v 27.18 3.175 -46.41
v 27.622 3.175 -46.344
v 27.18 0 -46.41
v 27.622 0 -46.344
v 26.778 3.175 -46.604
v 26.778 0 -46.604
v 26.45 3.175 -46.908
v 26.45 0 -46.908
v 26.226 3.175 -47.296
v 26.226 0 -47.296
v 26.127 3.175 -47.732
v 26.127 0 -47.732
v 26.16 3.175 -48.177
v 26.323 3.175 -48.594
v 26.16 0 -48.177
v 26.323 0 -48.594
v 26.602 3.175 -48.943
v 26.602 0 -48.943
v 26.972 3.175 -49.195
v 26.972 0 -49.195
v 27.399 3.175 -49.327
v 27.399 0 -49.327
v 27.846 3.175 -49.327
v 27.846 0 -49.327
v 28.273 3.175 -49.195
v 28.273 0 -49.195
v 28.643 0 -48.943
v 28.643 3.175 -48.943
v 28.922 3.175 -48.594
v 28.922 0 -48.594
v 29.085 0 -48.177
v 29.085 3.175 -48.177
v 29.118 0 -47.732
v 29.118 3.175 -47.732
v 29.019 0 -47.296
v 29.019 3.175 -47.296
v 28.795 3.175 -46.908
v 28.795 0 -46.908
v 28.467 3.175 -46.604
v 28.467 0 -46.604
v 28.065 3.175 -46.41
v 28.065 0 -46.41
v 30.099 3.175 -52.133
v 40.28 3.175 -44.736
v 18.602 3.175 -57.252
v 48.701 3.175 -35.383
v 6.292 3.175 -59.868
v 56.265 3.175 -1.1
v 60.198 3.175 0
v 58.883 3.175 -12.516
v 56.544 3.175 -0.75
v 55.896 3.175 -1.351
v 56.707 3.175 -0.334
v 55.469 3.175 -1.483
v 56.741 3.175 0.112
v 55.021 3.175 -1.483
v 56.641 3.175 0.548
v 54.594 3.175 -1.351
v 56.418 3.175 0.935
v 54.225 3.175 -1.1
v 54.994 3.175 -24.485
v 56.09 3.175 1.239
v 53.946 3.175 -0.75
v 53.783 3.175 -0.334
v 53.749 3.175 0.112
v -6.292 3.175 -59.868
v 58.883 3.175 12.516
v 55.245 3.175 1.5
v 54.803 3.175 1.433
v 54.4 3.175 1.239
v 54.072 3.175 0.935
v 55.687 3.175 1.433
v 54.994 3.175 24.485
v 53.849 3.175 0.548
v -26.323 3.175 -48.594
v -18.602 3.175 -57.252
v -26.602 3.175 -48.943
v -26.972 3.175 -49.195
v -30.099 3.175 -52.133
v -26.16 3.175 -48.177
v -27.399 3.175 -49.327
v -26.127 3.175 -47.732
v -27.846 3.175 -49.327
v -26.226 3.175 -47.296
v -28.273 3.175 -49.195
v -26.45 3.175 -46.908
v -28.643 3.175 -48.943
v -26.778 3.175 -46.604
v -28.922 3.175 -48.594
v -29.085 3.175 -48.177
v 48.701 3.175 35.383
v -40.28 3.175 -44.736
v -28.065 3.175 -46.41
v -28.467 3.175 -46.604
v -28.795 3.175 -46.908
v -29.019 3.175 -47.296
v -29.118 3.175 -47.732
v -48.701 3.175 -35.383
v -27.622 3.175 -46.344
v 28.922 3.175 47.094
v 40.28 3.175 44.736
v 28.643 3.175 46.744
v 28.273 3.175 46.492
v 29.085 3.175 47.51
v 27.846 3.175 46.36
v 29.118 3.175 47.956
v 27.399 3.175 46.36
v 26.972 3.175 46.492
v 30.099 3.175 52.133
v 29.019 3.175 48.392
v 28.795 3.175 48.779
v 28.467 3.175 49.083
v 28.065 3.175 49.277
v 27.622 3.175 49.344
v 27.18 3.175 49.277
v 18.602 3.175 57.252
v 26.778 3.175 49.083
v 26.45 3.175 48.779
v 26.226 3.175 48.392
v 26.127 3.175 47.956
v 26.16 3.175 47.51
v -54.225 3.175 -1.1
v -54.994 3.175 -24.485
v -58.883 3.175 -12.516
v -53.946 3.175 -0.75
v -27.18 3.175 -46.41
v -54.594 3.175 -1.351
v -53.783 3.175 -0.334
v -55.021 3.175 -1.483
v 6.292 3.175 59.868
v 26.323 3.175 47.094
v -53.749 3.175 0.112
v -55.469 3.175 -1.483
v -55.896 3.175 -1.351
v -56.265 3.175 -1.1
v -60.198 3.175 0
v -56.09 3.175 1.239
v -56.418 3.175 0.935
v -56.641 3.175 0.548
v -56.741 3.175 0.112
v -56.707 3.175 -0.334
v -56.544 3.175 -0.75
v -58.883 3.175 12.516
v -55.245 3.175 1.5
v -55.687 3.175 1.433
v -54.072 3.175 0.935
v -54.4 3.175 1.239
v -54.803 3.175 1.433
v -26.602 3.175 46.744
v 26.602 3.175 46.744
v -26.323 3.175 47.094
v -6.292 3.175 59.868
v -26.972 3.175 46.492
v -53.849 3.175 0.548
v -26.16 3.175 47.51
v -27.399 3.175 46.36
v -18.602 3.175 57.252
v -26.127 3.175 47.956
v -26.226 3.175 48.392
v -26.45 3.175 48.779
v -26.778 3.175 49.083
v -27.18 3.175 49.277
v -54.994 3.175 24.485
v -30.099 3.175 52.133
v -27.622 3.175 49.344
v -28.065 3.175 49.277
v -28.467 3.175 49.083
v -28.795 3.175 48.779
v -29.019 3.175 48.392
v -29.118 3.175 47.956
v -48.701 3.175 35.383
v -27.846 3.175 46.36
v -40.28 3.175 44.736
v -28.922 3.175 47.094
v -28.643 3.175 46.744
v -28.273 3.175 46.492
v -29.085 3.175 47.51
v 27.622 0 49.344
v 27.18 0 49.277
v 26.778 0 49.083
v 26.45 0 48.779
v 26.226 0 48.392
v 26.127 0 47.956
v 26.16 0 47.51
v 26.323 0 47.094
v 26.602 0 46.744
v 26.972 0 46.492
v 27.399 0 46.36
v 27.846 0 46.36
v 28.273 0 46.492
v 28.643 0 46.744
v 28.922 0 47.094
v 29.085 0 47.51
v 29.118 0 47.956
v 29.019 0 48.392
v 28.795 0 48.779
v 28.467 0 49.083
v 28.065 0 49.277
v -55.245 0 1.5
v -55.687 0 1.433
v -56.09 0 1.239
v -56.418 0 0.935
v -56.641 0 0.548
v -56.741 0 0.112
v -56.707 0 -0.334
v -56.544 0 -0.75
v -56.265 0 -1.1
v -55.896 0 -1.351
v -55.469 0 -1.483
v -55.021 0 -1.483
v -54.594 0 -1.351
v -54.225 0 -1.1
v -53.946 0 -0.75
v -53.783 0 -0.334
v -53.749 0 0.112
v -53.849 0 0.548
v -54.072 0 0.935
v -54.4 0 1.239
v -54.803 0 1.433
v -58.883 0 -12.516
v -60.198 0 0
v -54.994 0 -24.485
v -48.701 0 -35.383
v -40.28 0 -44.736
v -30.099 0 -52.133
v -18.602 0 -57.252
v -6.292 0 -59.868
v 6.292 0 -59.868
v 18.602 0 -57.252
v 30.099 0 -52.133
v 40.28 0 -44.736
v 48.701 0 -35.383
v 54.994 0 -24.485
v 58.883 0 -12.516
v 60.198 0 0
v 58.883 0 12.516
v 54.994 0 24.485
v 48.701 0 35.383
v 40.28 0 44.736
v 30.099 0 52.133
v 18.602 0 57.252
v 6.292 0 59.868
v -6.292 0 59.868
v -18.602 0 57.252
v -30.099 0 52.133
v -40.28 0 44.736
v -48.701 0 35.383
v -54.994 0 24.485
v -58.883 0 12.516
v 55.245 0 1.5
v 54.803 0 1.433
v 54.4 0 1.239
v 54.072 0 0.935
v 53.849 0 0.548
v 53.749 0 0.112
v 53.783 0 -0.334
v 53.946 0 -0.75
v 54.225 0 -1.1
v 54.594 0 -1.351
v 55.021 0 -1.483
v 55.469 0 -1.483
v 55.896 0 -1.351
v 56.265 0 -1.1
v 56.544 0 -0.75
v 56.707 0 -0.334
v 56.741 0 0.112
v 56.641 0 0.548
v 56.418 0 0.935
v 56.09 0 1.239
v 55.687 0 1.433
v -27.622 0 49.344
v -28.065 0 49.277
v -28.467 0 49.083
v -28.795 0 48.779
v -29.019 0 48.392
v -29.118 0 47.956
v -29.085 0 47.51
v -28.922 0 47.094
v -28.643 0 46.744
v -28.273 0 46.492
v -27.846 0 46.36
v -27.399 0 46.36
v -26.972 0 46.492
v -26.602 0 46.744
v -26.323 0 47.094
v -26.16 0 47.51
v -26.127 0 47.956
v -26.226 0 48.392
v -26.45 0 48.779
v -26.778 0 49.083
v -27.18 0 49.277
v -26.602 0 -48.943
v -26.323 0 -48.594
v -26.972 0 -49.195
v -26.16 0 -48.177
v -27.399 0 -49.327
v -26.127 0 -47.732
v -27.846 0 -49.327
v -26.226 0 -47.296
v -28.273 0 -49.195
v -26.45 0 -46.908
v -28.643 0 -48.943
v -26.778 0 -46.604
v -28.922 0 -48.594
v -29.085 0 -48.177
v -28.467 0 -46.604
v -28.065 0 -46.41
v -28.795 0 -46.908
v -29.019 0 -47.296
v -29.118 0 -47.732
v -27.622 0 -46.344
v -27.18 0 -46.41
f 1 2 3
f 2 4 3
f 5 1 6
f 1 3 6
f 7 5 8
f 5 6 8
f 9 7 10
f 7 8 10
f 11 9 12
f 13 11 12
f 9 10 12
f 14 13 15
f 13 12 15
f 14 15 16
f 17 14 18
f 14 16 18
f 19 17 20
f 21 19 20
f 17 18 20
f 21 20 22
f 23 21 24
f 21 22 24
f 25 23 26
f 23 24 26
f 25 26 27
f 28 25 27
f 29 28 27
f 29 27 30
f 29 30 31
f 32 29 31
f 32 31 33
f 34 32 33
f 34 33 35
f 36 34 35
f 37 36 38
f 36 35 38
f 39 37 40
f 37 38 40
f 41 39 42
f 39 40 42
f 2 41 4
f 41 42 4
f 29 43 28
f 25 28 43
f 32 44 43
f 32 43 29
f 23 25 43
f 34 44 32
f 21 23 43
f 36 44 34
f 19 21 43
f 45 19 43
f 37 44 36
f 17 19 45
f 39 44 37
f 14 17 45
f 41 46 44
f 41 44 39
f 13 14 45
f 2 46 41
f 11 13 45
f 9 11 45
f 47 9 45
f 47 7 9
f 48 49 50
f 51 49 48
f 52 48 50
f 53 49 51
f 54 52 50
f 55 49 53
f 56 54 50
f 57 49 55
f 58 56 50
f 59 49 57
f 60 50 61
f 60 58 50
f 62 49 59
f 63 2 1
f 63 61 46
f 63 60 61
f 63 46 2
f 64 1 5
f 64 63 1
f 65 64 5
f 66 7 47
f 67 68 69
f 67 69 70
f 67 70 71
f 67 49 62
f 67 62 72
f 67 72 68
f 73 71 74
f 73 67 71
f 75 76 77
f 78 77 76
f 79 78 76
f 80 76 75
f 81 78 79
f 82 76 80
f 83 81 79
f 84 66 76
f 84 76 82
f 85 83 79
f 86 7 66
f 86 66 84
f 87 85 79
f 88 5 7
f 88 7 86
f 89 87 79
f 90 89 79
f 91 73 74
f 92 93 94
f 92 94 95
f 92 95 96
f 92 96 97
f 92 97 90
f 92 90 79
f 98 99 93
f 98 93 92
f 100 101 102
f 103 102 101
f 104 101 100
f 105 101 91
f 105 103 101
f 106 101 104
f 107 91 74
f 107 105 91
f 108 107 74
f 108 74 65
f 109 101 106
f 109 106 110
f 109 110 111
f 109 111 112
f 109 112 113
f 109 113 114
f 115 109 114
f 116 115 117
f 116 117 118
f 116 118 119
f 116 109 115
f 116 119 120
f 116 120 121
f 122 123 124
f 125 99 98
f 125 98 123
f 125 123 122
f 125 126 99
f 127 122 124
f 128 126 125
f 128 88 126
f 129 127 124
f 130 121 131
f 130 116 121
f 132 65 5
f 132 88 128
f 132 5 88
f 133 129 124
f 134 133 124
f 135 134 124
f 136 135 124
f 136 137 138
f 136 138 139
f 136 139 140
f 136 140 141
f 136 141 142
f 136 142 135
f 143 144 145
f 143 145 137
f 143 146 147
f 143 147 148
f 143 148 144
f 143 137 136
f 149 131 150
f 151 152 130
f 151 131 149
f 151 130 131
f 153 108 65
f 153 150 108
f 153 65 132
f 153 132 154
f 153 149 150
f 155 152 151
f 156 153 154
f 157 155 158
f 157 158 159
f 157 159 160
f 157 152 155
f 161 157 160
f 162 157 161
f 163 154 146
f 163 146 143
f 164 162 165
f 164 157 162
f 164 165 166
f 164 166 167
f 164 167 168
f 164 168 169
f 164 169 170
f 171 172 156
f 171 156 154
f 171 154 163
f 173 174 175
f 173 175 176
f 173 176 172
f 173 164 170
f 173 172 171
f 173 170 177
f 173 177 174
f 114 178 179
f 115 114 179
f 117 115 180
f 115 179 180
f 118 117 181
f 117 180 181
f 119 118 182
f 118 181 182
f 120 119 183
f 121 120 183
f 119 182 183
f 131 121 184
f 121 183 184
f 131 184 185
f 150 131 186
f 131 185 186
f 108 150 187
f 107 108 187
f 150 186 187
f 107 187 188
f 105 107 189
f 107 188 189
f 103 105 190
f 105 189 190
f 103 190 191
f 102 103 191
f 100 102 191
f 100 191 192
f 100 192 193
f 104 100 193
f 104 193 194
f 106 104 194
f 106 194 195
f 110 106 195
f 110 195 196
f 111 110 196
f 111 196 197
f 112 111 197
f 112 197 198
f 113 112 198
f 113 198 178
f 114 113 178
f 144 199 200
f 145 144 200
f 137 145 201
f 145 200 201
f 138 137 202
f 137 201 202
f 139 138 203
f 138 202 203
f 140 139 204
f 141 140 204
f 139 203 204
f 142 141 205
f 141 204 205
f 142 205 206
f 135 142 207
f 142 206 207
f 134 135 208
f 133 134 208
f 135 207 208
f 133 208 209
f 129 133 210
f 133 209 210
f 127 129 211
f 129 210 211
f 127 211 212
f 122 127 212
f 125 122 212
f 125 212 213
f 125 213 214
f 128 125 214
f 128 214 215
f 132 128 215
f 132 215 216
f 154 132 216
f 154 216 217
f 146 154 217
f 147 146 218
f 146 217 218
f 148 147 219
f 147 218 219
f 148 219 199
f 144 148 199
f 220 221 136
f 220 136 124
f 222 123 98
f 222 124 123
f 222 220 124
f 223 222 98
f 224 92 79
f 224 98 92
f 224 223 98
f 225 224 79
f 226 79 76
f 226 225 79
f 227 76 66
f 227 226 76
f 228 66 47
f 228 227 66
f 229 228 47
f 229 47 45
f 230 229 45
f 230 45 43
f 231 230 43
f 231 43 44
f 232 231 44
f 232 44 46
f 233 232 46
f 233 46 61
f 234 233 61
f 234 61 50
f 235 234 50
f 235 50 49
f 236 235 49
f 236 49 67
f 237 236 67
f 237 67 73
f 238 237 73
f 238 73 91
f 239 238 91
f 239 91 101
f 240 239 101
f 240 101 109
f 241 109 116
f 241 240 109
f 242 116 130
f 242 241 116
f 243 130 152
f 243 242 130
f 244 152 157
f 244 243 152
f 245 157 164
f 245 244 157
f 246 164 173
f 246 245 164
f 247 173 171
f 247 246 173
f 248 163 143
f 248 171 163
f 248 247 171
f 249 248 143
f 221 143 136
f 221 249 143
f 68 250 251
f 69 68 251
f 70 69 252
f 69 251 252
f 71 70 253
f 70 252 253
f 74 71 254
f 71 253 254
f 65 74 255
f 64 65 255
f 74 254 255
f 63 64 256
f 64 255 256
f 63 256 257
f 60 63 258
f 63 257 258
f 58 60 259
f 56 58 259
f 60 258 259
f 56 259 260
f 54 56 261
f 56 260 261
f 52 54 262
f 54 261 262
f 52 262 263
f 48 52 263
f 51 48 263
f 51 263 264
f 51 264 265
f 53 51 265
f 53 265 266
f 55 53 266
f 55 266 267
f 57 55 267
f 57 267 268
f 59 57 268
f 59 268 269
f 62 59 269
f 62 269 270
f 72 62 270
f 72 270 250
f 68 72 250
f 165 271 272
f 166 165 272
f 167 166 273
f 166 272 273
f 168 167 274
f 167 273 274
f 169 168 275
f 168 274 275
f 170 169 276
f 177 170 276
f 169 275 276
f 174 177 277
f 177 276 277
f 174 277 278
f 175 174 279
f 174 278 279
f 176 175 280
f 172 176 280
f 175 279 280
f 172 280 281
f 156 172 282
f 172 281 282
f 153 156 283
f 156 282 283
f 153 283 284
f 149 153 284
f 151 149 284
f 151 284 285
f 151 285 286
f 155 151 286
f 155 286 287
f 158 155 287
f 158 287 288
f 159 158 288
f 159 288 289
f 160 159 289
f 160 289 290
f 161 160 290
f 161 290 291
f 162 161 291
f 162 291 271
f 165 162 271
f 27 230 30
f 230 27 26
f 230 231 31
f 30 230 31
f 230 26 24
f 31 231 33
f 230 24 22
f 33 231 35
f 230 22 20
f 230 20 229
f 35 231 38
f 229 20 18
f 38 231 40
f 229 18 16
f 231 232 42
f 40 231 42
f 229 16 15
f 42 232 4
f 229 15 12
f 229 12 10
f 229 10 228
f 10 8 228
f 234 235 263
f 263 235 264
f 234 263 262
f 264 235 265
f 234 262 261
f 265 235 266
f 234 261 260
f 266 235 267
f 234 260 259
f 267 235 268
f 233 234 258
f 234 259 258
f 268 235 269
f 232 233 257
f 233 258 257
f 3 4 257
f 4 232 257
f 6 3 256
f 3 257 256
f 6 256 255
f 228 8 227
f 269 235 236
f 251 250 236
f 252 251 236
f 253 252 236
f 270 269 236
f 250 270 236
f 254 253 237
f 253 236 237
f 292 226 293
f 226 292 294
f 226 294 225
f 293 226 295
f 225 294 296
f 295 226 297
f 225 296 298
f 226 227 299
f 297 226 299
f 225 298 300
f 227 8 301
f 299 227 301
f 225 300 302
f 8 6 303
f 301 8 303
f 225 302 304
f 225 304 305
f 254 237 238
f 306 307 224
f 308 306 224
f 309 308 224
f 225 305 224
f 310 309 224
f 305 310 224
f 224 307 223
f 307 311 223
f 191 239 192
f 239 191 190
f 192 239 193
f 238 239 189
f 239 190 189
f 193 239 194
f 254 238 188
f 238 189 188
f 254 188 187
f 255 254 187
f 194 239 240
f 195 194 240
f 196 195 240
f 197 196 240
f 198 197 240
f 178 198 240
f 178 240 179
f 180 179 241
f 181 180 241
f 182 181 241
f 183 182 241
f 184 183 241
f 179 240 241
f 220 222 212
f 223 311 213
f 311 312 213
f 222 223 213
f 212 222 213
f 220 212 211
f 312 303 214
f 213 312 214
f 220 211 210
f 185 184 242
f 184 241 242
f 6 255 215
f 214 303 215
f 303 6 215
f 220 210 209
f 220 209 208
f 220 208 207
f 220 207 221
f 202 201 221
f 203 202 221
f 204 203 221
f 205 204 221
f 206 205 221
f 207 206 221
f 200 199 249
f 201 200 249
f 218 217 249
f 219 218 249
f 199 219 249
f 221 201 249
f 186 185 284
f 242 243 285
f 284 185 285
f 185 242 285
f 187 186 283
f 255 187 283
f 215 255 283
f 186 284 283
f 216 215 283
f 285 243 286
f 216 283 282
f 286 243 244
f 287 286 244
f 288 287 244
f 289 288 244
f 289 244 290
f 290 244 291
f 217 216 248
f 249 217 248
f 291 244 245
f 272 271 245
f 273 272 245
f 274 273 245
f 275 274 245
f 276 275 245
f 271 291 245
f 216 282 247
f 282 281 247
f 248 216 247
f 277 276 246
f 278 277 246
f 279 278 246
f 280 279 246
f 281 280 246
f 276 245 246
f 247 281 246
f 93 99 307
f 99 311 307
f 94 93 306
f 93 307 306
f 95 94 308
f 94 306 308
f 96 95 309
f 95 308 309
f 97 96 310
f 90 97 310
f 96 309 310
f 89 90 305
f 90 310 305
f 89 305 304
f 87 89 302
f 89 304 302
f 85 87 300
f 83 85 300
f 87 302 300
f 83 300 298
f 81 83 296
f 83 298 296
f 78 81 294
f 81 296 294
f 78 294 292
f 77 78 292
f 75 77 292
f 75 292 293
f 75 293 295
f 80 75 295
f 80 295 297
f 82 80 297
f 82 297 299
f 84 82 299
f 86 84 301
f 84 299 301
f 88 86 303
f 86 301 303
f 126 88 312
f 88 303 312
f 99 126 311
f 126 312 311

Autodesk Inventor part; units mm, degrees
ref_plane "YZ Plane" through (0, 0, 0) normal (1, 0, 0) x (0, 1, 0)
ref_plane "XZ Plane" through (0, 0, 0) normal (0, 1, 0) x (-1, 0, 0)
ref_plane "XY Plane" through (0, 0, 0) normal (0, 0, 1) x (1, 0, 0)
sketch "Sketch2" plane through (0, 0, 0) normal (0, 1, 0) x (-1, 0, 0)
  circle A0 centre (0, 0) radius 60.198
  dimension "d3" = 120.396
extrude "Extrusion1" add sketch "Sketch2" along normal blind 3.175
sketch "Sketch3" plane through (0, 3.175, 0) normal (0, 1, 0) x (1, 0, 0)
  point P0 (0, 0)
  point P1 (-55.245, 0)
  point P2 (-27.6225, -47.8436)
  point P3 (27.6225, -47.8436)
  point P4 (55.245, 0)
  point P5 (27.6225, 47.8436)
  point P6 (-27.6225, 47.8436)
  dimension "d6" = 55.245
  dimension "d9" = 360
hole "Hole1" at (-55.245, 3.175, 0) at (-27.6225, 3.175, 47.8436) at (27.6225, 3.175, 47.8436) at (55.245, 3.175, 0) at (27.6225, 3.175, -47.8436) at (-27.6225, 3.175, -47.8436) direction (0, -1, 0) diameter 3 depth 25.4 tip angle 118
properties part number "Acrylic lense"
